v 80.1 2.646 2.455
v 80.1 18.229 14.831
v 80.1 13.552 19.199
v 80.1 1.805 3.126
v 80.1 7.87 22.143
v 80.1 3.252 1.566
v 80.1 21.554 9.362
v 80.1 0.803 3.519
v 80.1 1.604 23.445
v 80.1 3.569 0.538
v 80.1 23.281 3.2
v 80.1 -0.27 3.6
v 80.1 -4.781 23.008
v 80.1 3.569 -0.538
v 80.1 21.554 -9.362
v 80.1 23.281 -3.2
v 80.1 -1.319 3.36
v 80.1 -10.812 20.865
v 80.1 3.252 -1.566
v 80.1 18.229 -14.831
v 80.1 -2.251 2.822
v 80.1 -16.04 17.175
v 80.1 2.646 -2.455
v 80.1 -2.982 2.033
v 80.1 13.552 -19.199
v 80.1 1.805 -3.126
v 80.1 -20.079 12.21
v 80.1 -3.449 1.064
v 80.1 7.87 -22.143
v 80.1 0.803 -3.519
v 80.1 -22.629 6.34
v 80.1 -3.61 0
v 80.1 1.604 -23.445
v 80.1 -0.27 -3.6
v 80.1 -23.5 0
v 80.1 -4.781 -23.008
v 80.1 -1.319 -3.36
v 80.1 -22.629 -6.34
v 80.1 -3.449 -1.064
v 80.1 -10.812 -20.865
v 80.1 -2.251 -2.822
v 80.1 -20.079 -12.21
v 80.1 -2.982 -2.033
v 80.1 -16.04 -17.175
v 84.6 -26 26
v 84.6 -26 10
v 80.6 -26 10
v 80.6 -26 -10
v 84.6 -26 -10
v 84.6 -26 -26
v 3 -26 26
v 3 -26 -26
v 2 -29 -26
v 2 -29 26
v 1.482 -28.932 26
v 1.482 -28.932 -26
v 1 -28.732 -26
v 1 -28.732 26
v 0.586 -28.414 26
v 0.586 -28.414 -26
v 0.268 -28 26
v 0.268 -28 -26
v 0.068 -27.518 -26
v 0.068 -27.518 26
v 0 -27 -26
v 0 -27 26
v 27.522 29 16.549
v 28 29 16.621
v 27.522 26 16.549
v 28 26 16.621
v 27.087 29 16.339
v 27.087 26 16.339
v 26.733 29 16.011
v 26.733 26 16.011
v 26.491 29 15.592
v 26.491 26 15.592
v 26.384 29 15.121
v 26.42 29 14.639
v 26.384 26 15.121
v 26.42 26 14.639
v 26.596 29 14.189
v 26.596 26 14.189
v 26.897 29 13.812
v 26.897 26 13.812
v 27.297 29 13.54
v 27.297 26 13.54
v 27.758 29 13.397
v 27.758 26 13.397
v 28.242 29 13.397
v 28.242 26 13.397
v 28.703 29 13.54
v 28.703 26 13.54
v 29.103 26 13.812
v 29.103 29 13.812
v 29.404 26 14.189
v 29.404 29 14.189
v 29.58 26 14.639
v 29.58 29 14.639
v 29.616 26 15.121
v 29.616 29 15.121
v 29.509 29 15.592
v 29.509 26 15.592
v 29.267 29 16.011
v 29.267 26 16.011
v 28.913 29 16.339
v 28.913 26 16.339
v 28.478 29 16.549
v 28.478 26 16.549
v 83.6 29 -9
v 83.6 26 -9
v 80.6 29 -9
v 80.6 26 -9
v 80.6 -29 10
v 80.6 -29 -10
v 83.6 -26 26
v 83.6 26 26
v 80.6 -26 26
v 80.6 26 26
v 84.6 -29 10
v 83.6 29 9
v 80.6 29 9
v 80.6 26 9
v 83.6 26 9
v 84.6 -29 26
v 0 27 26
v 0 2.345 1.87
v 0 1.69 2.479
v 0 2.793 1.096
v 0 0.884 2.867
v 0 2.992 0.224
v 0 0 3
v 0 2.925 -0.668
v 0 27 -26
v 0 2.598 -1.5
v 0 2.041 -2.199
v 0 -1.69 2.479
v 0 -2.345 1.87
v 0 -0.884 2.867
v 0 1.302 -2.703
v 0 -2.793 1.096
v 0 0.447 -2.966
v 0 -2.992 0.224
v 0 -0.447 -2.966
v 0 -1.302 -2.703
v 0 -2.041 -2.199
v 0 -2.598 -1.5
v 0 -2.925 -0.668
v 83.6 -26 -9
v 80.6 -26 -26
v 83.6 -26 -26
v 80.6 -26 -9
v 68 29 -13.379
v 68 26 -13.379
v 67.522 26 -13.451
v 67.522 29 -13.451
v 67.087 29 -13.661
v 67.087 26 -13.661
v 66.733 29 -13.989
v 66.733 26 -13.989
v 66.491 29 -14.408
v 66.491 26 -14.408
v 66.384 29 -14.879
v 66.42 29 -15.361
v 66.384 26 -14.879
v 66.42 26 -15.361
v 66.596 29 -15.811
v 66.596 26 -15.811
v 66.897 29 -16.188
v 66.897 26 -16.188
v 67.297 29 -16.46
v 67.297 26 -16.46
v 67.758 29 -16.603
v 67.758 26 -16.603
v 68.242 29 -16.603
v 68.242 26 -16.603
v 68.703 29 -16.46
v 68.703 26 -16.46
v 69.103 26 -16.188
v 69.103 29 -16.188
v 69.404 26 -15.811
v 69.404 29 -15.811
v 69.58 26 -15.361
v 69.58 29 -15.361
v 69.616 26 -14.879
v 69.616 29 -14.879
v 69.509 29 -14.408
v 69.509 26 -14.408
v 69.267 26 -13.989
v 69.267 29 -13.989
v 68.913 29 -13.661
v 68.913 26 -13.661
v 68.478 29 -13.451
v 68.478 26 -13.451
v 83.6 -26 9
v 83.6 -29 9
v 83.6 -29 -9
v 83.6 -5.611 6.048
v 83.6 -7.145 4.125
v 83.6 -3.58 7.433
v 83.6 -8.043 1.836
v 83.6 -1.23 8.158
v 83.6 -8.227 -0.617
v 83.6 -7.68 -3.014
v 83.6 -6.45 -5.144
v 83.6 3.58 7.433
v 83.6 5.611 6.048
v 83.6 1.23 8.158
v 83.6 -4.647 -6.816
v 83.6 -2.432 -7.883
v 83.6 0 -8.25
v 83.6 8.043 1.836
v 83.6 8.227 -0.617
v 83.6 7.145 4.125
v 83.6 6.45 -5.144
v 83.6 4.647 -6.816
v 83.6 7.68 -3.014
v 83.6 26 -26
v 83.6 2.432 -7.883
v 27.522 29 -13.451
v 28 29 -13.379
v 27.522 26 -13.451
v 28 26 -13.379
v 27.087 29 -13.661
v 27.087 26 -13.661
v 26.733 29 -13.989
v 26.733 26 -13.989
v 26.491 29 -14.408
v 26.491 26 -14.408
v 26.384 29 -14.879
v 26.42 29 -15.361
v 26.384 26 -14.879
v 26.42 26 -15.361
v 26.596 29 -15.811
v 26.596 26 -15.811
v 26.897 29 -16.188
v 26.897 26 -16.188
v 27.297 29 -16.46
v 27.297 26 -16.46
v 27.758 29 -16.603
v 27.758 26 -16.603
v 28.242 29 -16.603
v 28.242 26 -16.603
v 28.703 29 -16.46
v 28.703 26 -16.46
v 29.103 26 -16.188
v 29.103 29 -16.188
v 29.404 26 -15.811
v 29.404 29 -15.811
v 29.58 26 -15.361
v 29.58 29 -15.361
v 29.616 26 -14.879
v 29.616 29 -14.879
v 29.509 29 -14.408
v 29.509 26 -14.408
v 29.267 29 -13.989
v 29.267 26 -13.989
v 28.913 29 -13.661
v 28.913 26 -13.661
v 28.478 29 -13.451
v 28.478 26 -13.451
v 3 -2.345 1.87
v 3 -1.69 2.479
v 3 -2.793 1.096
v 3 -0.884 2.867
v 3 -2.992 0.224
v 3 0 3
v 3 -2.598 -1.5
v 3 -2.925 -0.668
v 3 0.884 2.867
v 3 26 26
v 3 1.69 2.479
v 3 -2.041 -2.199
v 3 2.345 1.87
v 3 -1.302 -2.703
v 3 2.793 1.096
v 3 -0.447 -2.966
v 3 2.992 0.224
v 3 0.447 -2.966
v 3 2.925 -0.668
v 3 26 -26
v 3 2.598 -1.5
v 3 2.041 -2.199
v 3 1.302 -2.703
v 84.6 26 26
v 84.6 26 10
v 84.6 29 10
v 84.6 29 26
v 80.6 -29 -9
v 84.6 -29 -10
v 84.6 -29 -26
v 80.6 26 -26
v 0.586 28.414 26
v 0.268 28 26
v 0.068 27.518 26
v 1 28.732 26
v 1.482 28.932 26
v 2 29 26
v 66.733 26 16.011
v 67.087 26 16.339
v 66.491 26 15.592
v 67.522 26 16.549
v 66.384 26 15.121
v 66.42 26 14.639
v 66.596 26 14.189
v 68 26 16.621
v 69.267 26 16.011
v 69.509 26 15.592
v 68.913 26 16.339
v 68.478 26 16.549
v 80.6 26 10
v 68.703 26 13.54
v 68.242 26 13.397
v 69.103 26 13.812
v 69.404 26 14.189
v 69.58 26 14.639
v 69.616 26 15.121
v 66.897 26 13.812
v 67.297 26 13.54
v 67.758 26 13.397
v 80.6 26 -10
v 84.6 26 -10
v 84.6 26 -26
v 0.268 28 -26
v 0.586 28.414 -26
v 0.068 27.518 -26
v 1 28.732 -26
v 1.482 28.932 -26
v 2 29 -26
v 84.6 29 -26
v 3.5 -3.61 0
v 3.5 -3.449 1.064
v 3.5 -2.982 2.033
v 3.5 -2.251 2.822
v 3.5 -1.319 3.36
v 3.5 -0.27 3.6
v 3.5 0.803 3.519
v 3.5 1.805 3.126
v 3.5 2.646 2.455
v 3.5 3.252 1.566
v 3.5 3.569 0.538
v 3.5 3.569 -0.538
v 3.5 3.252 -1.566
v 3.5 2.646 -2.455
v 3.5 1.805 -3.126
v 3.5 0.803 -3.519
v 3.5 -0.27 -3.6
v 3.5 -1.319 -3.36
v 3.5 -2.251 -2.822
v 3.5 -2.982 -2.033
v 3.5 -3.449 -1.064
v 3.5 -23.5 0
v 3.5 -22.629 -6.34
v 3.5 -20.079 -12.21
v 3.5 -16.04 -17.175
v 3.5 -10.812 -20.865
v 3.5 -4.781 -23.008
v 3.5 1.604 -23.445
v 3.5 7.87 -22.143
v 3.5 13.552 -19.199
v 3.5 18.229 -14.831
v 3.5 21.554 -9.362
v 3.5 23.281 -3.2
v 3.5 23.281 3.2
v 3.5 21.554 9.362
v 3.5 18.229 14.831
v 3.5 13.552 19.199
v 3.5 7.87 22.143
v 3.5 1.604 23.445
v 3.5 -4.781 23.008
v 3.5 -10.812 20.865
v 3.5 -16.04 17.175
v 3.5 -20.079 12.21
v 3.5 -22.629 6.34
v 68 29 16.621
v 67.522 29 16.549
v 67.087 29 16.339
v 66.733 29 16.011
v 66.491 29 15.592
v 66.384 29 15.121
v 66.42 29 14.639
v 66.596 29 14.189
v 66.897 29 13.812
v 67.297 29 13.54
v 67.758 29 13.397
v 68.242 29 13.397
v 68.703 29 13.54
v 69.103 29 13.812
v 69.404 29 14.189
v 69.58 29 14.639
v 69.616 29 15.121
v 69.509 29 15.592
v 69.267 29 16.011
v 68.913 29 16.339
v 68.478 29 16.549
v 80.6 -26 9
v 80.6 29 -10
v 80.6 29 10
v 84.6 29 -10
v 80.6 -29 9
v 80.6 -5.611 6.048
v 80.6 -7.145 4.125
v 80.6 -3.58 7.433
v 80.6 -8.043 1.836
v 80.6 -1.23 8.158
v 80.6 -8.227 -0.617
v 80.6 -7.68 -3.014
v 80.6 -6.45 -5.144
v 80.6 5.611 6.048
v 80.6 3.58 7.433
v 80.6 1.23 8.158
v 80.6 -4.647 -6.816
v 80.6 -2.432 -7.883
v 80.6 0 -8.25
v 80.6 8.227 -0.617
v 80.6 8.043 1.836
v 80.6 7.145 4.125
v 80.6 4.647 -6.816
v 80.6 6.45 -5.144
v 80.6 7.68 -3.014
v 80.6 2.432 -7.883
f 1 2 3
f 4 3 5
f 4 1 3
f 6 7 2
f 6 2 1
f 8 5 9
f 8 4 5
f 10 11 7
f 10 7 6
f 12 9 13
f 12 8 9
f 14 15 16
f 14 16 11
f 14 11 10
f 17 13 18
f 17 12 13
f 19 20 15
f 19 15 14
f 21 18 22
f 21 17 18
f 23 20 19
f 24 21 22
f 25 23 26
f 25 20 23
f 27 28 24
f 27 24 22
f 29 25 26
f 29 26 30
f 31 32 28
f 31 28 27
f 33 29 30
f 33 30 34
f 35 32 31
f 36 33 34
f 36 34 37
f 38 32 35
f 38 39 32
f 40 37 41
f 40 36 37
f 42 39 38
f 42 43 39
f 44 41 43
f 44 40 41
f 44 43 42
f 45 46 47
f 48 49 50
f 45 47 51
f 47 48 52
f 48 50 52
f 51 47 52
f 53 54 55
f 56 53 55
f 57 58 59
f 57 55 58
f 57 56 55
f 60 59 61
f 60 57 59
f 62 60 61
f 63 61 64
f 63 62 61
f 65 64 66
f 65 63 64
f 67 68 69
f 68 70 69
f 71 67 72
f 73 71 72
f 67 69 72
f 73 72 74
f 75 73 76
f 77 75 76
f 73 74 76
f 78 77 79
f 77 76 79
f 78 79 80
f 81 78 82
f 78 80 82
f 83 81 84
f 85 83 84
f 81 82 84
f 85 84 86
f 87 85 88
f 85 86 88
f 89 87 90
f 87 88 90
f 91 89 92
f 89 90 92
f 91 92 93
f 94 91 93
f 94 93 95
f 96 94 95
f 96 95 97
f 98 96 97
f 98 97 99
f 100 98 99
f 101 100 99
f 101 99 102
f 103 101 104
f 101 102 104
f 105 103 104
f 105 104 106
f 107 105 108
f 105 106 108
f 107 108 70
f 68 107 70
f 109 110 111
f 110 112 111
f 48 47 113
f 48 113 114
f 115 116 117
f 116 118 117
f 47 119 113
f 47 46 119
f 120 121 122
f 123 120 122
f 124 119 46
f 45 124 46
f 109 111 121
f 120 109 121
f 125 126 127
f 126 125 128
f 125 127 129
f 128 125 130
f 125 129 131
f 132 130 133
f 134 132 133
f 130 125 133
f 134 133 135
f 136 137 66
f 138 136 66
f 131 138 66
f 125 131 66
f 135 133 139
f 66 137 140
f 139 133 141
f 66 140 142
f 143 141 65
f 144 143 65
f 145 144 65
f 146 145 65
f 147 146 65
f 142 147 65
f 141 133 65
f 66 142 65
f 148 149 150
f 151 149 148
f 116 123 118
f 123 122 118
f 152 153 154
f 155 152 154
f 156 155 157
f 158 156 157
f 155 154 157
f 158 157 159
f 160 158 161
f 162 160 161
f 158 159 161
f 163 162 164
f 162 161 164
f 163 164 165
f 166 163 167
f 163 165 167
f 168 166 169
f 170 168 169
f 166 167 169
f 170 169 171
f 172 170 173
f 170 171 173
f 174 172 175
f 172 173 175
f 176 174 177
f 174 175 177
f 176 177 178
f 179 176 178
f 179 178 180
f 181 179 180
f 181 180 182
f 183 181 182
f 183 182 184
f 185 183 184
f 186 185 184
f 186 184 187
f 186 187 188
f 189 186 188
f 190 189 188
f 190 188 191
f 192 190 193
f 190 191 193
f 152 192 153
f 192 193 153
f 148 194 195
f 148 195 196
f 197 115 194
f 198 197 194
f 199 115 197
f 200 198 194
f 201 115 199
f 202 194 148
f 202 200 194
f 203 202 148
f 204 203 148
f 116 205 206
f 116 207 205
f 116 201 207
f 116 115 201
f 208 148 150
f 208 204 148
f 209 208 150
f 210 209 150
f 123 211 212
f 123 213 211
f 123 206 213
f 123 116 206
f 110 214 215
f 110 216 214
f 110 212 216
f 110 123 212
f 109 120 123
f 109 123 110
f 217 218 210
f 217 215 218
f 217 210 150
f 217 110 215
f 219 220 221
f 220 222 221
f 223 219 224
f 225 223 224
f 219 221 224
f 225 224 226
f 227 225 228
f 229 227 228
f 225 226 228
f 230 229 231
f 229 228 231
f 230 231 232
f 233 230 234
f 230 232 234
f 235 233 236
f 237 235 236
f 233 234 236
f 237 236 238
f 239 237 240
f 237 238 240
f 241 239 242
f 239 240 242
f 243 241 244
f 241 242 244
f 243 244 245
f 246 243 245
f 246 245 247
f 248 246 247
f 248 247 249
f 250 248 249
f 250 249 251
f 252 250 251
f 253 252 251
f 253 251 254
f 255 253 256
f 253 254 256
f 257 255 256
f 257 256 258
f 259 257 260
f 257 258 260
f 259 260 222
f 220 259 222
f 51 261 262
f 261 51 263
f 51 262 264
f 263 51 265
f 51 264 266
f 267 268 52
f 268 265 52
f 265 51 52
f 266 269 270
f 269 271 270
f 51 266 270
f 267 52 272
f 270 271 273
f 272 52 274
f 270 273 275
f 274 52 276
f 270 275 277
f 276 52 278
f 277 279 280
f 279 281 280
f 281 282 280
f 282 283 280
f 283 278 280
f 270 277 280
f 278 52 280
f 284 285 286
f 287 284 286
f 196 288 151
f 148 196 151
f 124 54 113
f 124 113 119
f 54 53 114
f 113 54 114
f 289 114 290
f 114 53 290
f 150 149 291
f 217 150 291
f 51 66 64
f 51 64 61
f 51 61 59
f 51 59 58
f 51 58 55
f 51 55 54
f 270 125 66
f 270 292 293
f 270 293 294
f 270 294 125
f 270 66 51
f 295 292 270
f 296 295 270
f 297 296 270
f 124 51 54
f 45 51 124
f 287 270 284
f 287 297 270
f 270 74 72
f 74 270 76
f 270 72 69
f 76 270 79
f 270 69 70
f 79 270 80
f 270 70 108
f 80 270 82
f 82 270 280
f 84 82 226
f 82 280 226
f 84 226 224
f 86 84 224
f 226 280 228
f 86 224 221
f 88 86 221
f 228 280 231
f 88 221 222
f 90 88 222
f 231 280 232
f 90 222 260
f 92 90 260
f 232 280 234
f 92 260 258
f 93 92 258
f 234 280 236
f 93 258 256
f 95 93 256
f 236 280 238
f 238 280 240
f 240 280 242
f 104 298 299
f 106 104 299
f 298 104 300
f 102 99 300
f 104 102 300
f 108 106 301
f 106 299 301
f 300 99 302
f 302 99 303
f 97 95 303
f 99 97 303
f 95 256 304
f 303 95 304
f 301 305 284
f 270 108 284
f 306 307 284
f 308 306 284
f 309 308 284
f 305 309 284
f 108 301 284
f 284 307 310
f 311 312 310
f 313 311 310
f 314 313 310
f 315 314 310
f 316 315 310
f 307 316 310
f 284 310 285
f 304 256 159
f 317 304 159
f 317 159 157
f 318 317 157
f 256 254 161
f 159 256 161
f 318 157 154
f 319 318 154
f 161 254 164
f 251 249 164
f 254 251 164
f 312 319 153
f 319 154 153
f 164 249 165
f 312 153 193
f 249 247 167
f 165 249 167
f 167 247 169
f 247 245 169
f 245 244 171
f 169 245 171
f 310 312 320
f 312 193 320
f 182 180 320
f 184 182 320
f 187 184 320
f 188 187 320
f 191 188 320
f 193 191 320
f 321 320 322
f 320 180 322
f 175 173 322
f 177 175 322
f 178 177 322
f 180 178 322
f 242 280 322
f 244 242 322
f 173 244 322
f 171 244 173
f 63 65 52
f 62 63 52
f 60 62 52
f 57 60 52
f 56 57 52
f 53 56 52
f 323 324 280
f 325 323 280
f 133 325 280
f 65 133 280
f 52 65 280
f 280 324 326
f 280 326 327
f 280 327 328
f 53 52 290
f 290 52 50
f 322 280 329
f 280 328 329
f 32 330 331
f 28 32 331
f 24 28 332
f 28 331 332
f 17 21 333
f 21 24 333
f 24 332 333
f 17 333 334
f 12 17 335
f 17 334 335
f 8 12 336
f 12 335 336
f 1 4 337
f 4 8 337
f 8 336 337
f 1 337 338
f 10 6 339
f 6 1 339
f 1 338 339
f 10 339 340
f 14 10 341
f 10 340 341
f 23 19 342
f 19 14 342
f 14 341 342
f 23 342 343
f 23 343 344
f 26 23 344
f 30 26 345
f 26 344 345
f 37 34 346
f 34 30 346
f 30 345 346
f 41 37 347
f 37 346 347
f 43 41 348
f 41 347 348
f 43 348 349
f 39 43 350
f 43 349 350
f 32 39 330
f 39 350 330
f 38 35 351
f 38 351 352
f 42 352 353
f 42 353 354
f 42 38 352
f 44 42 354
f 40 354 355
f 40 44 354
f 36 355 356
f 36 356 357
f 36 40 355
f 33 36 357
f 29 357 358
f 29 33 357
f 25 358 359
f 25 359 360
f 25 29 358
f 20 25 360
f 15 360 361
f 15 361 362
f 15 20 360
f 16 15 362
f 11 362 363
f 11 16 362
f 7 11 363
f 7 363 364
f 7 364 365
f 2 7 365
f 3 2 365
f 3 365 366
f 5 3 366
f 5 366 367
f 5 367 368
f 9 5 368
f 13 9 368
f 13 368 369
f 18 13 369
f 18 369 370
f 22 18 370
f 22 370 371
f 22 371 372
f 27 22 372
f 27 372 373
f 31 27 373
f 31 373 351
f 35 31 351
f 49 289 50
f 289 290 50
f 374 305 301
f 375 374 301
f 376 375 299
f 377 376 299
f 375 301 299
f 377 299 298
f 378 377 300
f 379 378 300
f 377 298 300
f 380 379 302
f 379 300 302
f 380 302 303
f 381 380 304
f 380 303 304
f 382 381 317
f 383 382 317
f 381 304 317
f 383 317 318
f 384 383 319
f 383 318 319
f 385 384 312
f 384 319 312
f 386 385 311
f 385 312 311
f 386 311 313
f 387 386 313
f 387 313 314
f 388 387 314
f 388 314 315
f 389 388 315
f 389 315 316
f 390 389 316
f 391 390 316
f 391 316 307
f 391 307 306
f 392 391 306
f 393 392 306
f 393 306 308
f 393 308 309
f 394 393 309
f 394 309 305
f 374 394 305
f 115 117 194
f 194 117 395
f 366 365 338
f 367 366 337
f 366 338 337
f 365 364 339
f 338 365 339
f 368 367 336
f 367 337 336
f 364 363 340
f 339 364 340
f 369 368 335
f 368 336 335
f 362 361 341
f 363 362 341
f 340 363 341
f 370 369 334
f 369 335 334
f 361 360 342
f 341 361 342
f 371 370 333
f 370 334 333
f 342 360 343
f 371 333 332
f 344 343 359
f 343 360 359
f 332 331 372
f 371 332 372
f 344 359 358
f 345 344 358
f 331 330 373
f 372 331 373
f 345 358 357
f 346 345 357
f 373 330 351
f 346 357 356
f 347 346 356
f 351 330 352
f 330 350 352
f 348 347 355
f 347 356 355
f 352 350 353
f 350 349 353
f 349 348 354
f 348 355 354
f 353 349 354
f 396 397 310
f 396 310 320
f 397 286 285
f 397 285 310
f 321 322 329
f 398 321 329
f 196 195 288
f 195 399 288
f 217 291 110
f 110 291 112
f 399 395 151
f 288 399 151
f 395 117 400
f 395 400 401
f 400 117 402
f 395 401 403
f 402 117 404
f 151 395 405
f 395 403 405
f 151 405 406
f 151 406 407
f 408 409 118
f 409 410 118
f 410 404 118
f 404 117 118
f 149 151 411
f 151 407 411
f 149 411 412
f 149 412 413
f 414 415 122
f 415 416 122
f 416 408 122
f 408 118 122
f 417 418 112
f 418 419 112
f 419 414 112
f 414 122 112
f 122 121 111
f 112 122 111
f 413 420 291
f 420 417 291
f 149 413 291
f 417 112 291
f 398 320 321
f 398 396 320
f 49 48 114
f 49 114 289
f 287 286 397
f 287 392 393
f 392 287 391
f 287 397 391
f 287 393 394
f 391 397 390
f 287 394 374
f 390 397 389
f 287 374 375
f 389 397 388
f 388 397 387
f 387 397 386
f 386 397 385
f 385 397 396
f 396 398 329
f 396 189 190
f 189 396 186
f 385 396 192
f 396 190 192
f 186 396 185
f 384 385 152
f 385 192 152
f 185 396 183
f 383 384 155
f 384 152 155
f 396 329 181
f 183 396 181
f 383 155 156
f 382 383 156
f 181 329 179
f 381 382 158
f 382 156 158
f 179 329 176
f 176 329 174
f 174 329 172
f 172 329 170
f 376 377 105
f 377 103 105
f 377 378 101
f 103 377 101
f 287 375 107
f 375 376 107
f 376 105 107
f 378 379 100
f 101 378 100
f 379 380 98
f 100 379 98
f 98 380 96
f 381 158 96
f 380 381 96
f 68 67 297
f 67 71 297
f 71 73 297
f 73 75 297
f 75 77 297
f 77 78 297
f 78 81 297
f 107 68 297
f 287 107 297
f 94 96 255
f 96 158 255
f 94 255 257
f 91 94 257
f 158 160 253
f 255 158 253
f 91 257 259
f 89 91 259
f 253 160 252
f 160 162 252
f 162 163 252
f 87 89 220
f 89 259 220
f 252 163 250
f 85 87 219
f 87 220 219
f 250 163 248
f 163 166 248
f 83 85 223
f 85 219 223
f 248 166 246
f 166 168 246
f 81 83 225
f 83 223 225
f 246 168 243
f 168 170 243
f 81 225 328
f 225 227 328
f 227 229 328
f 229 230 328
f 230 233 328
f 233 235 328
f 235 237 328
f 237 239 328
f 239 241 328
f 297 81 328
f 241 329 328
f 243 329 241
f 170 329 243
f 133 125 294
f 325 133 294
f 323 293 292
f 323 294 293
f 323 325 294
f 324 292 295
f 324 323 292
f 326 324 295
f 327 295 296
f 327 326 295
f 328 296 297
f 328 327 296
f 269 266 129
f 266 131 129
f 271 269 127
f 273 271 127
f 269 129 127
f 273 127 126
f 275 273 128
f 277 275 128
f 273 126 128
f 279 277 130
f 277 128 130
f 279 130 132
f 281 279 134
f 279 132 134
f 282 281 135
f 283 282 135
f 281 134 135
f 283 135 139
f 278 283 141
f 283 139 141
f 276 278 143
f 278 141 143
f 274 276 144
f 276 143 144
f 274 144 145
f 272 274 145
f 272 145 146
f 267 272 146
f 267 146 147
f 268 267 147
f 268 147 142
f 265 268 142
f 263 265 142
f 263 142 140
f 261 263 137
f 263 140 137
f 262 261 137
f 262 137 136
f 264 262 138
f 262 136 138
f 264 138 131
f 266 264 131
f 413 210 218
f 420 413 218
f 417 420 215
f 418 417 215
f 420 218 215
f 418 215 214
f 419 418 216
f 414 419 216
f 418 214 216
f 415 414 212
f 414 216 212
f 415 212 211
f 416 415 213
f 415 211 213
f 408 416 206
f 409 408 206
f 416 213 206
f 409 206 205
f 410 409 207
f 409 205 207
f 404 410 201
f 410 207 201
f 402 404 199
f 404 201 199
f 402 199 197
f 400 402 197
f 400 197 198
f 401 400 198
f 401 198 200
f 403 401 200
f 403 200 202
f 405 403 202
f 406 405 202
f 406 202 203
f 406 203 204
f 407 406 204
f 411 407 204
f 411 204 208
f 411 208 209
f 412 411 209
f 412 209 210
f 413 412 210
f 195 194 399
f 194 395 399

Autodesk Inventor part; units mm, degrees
ref_plane "YZ Plane" through (0, 0, 0) normal (1, 0, 0) x (0, 1, 0)
ref_plane "XZ Plane" through (0, 0, 0) normal (0, 1, 0) x (-1, 0, 0)
ref_plane "XY Plane" through (0, 0, 0) normal (0, 0, 1) x (1, 0, 0)
sketch "Эскиз2" plane through (0, 0, 0) normal (0, 0, 1) x (1, 0, 0)
  line L0 (84.6, 29) -> (2, 29)
  line L1 (0, 27) -> (0, -27)
  line L2 (2, -29) -> (84.6, -29)
  line L3 (84.6, -26) -> (3, -26)
  line L4 (3, -26) -> (3, 26)
  line L5 (3, 26) -> (84.6, 26)
  line L6 (84.6, -29) -> (84.6, -26)
  line L7 (84.6, 26) -> (84.6, 29)
  arc A0 (0, -27) -> (2, -29) centre (2, -27) ccw
  arc A1 (2, 29) -> (0, 27) centre (2, 27) ccw
  point P0 (0, 0)
  point P1 (0, -29)
  point P2 (0, 29)
  point P3 (0, 0)
  dimension "d0" = 84.6
  dimension "d1" = 3
  dimension "d2" = 58
  dimension "d34" = 2
extrude "Выдавливание1" add sketch "Эскиз2" along normal mid plane 52
sketch "Эскиз3" plane through (0, 29, 26) normal (0, 1, 0) x (1, 0, 0)
  line L0 (84.6, 0) -> (84.6, 52) projected
  point P0 (0, 26)
  point P1 (68, 11)
  point P2 (28, 11)
  point P3 (28, 41)
  point P4 (68, 41)
  dimension "d5" = 40
  dimension "d6" = 16.6
  dimension "d7" = 30
  dimension "d8" = 15
hole "Отверстие1" at (68, 29, 15) at (28, 29, 15) at (28, 29, -15) at (68, 29, -15) direction (0, -1, 0) diameter 3.242 depth 3 tip angle 118 thread size "M4x0.7" class "6H" standard "ISO Metric profile"
sketch "Эскиз4" plane through (0, -29, 26) normal (-1, 0, 0) x (0, 0, 1)
  circle A0 centre (-26, 29) radius 3
  point P0 (-26, 29)
  dimension "d16" = 6
extrude "Выдавливание2" cut sketch "Эскиз4" against normal blind 4
sketch "Эскиз5" plane through (0, 29, 26) normal (0, 1, 0) x (1, 0, 0)
  line L0 (80.6, 36) -> (84.6, 36)
  line L1 (84.6, 36) -> (84.6, 16)
  line L2 (84.6, 16) -> (80.6, 16)
  line L3 (80.6, 16) -> (80.6, 36)
  line L4 (84.6, 0) -> (84.6, 52) projected
  point P0 (0, 26)
  point P1 (84.6, 26)
  dimension "d19" = 4
  dimension "d20" = 20
extrude "Выдавливание3" cut sketch "Эскиз5" against normal through all
sketch "Эскиз6" plane through (80.6, -29, 10) normal (1, 0, 0) x (0, 0, -1)
  line L0 (36, 3) -> (36, 55)
  line L1 (36, 55) -> (19, 55)
  line L2 (19, 55) -> (19, 58)
  line L3 (36, 58) -> (-16, 58)
  line L4 (19, 58) -> (1, 58)
  line L5 (1, 58) -> (1, 55)
  line L6 (1, 55) -> (-16, 55)
  line L7 (-16, 56) -> (-16, 2)
  line L8 (-16, 55) -> (-16, 3)
  line L9 (-16, 3) -> (1, 3)
  line L10 (1, 3) -> (1, 0)
  line L11 (1, 0) -> (19, 0)
  line L12 (36, 0) -> (-16, 0)
  line L13 (19, 0) -> (19, 3)
  line L14 (36, 3) -> (19, 3)
  line L15 (36, 55) -> (36, 3)
  point P0 (10, 29)
  point P1 (10, 0)
  dimension "d23" = 18
  dimension "d24" = 18
extrude "Выдавливание4" add sketch "Эскиз6" along normal blind 3 separate body
sketch "Эскиз7" plane through (83.6, -29, 10) normal (1, 0, 0) x (0, 0, -1)
  circle A0 centre (10, 29) radius 8.25
  point P0 (10, 29)
  dimension "d27" = 16.5
extrude "Выдавливание5" cut sketch "Эскиз7" against normal blind 3 bodies 2
sketch "Эскиз8" plane through (0, 0, 0) normal (0, 0, 1) x (1, 0, 0)
  line L0 (3.5, -23.5) -> (80.1, -23.5)
  line L1 (80.1, -23.5) -> (80.1, -3.6097)
  line L2 (80.1, -3.6097) -> (3.5, -3.6097)
  line L3 (3.5, -3.6097) -> (3.5, -23.5)
  line L4 (0, 0) -> (96.507, 0)
  line L5 (3, -26) -> (3, 26) projected
  line L6 (80.6, -26) -> (80.6, 26) projected
  dimension "d30" = 47
  dimension "d31" = 0.5
  dimension "d32" = 0.5
revolve "Вращение1" add sketch "Эскиз8" angle 360 about axis through (0, 0, 0) along (1, 0, 0) separate body
equation "\"d8\" = 0.5 * d7"
equation "\"d32\" = d31"
equation "\"Радиус_гибки\" = Толщина"
equation "\"Ширина_просечки\" = Толщина"
equation "\"Глубина_просечки\" = 0.5 * Толщина"
equation "\"Размер_просечки\" = 4 * Толщина"
equation "\"Мин_остаток\" = 2 * Толщина"
equation "\"Радиус_перехода\" = Радиус_гибки"
equation "\"Радиус_Якоби\" = Радиус_гибки"
equation "\"Размер_зазора\" = Толщина"
equation "\"Толщина\" = 2"
properties part number "JF_0837B_Linear solenoid Pull 15N 12v1A Frame" material "Сталь нержавеющая, 440C"
